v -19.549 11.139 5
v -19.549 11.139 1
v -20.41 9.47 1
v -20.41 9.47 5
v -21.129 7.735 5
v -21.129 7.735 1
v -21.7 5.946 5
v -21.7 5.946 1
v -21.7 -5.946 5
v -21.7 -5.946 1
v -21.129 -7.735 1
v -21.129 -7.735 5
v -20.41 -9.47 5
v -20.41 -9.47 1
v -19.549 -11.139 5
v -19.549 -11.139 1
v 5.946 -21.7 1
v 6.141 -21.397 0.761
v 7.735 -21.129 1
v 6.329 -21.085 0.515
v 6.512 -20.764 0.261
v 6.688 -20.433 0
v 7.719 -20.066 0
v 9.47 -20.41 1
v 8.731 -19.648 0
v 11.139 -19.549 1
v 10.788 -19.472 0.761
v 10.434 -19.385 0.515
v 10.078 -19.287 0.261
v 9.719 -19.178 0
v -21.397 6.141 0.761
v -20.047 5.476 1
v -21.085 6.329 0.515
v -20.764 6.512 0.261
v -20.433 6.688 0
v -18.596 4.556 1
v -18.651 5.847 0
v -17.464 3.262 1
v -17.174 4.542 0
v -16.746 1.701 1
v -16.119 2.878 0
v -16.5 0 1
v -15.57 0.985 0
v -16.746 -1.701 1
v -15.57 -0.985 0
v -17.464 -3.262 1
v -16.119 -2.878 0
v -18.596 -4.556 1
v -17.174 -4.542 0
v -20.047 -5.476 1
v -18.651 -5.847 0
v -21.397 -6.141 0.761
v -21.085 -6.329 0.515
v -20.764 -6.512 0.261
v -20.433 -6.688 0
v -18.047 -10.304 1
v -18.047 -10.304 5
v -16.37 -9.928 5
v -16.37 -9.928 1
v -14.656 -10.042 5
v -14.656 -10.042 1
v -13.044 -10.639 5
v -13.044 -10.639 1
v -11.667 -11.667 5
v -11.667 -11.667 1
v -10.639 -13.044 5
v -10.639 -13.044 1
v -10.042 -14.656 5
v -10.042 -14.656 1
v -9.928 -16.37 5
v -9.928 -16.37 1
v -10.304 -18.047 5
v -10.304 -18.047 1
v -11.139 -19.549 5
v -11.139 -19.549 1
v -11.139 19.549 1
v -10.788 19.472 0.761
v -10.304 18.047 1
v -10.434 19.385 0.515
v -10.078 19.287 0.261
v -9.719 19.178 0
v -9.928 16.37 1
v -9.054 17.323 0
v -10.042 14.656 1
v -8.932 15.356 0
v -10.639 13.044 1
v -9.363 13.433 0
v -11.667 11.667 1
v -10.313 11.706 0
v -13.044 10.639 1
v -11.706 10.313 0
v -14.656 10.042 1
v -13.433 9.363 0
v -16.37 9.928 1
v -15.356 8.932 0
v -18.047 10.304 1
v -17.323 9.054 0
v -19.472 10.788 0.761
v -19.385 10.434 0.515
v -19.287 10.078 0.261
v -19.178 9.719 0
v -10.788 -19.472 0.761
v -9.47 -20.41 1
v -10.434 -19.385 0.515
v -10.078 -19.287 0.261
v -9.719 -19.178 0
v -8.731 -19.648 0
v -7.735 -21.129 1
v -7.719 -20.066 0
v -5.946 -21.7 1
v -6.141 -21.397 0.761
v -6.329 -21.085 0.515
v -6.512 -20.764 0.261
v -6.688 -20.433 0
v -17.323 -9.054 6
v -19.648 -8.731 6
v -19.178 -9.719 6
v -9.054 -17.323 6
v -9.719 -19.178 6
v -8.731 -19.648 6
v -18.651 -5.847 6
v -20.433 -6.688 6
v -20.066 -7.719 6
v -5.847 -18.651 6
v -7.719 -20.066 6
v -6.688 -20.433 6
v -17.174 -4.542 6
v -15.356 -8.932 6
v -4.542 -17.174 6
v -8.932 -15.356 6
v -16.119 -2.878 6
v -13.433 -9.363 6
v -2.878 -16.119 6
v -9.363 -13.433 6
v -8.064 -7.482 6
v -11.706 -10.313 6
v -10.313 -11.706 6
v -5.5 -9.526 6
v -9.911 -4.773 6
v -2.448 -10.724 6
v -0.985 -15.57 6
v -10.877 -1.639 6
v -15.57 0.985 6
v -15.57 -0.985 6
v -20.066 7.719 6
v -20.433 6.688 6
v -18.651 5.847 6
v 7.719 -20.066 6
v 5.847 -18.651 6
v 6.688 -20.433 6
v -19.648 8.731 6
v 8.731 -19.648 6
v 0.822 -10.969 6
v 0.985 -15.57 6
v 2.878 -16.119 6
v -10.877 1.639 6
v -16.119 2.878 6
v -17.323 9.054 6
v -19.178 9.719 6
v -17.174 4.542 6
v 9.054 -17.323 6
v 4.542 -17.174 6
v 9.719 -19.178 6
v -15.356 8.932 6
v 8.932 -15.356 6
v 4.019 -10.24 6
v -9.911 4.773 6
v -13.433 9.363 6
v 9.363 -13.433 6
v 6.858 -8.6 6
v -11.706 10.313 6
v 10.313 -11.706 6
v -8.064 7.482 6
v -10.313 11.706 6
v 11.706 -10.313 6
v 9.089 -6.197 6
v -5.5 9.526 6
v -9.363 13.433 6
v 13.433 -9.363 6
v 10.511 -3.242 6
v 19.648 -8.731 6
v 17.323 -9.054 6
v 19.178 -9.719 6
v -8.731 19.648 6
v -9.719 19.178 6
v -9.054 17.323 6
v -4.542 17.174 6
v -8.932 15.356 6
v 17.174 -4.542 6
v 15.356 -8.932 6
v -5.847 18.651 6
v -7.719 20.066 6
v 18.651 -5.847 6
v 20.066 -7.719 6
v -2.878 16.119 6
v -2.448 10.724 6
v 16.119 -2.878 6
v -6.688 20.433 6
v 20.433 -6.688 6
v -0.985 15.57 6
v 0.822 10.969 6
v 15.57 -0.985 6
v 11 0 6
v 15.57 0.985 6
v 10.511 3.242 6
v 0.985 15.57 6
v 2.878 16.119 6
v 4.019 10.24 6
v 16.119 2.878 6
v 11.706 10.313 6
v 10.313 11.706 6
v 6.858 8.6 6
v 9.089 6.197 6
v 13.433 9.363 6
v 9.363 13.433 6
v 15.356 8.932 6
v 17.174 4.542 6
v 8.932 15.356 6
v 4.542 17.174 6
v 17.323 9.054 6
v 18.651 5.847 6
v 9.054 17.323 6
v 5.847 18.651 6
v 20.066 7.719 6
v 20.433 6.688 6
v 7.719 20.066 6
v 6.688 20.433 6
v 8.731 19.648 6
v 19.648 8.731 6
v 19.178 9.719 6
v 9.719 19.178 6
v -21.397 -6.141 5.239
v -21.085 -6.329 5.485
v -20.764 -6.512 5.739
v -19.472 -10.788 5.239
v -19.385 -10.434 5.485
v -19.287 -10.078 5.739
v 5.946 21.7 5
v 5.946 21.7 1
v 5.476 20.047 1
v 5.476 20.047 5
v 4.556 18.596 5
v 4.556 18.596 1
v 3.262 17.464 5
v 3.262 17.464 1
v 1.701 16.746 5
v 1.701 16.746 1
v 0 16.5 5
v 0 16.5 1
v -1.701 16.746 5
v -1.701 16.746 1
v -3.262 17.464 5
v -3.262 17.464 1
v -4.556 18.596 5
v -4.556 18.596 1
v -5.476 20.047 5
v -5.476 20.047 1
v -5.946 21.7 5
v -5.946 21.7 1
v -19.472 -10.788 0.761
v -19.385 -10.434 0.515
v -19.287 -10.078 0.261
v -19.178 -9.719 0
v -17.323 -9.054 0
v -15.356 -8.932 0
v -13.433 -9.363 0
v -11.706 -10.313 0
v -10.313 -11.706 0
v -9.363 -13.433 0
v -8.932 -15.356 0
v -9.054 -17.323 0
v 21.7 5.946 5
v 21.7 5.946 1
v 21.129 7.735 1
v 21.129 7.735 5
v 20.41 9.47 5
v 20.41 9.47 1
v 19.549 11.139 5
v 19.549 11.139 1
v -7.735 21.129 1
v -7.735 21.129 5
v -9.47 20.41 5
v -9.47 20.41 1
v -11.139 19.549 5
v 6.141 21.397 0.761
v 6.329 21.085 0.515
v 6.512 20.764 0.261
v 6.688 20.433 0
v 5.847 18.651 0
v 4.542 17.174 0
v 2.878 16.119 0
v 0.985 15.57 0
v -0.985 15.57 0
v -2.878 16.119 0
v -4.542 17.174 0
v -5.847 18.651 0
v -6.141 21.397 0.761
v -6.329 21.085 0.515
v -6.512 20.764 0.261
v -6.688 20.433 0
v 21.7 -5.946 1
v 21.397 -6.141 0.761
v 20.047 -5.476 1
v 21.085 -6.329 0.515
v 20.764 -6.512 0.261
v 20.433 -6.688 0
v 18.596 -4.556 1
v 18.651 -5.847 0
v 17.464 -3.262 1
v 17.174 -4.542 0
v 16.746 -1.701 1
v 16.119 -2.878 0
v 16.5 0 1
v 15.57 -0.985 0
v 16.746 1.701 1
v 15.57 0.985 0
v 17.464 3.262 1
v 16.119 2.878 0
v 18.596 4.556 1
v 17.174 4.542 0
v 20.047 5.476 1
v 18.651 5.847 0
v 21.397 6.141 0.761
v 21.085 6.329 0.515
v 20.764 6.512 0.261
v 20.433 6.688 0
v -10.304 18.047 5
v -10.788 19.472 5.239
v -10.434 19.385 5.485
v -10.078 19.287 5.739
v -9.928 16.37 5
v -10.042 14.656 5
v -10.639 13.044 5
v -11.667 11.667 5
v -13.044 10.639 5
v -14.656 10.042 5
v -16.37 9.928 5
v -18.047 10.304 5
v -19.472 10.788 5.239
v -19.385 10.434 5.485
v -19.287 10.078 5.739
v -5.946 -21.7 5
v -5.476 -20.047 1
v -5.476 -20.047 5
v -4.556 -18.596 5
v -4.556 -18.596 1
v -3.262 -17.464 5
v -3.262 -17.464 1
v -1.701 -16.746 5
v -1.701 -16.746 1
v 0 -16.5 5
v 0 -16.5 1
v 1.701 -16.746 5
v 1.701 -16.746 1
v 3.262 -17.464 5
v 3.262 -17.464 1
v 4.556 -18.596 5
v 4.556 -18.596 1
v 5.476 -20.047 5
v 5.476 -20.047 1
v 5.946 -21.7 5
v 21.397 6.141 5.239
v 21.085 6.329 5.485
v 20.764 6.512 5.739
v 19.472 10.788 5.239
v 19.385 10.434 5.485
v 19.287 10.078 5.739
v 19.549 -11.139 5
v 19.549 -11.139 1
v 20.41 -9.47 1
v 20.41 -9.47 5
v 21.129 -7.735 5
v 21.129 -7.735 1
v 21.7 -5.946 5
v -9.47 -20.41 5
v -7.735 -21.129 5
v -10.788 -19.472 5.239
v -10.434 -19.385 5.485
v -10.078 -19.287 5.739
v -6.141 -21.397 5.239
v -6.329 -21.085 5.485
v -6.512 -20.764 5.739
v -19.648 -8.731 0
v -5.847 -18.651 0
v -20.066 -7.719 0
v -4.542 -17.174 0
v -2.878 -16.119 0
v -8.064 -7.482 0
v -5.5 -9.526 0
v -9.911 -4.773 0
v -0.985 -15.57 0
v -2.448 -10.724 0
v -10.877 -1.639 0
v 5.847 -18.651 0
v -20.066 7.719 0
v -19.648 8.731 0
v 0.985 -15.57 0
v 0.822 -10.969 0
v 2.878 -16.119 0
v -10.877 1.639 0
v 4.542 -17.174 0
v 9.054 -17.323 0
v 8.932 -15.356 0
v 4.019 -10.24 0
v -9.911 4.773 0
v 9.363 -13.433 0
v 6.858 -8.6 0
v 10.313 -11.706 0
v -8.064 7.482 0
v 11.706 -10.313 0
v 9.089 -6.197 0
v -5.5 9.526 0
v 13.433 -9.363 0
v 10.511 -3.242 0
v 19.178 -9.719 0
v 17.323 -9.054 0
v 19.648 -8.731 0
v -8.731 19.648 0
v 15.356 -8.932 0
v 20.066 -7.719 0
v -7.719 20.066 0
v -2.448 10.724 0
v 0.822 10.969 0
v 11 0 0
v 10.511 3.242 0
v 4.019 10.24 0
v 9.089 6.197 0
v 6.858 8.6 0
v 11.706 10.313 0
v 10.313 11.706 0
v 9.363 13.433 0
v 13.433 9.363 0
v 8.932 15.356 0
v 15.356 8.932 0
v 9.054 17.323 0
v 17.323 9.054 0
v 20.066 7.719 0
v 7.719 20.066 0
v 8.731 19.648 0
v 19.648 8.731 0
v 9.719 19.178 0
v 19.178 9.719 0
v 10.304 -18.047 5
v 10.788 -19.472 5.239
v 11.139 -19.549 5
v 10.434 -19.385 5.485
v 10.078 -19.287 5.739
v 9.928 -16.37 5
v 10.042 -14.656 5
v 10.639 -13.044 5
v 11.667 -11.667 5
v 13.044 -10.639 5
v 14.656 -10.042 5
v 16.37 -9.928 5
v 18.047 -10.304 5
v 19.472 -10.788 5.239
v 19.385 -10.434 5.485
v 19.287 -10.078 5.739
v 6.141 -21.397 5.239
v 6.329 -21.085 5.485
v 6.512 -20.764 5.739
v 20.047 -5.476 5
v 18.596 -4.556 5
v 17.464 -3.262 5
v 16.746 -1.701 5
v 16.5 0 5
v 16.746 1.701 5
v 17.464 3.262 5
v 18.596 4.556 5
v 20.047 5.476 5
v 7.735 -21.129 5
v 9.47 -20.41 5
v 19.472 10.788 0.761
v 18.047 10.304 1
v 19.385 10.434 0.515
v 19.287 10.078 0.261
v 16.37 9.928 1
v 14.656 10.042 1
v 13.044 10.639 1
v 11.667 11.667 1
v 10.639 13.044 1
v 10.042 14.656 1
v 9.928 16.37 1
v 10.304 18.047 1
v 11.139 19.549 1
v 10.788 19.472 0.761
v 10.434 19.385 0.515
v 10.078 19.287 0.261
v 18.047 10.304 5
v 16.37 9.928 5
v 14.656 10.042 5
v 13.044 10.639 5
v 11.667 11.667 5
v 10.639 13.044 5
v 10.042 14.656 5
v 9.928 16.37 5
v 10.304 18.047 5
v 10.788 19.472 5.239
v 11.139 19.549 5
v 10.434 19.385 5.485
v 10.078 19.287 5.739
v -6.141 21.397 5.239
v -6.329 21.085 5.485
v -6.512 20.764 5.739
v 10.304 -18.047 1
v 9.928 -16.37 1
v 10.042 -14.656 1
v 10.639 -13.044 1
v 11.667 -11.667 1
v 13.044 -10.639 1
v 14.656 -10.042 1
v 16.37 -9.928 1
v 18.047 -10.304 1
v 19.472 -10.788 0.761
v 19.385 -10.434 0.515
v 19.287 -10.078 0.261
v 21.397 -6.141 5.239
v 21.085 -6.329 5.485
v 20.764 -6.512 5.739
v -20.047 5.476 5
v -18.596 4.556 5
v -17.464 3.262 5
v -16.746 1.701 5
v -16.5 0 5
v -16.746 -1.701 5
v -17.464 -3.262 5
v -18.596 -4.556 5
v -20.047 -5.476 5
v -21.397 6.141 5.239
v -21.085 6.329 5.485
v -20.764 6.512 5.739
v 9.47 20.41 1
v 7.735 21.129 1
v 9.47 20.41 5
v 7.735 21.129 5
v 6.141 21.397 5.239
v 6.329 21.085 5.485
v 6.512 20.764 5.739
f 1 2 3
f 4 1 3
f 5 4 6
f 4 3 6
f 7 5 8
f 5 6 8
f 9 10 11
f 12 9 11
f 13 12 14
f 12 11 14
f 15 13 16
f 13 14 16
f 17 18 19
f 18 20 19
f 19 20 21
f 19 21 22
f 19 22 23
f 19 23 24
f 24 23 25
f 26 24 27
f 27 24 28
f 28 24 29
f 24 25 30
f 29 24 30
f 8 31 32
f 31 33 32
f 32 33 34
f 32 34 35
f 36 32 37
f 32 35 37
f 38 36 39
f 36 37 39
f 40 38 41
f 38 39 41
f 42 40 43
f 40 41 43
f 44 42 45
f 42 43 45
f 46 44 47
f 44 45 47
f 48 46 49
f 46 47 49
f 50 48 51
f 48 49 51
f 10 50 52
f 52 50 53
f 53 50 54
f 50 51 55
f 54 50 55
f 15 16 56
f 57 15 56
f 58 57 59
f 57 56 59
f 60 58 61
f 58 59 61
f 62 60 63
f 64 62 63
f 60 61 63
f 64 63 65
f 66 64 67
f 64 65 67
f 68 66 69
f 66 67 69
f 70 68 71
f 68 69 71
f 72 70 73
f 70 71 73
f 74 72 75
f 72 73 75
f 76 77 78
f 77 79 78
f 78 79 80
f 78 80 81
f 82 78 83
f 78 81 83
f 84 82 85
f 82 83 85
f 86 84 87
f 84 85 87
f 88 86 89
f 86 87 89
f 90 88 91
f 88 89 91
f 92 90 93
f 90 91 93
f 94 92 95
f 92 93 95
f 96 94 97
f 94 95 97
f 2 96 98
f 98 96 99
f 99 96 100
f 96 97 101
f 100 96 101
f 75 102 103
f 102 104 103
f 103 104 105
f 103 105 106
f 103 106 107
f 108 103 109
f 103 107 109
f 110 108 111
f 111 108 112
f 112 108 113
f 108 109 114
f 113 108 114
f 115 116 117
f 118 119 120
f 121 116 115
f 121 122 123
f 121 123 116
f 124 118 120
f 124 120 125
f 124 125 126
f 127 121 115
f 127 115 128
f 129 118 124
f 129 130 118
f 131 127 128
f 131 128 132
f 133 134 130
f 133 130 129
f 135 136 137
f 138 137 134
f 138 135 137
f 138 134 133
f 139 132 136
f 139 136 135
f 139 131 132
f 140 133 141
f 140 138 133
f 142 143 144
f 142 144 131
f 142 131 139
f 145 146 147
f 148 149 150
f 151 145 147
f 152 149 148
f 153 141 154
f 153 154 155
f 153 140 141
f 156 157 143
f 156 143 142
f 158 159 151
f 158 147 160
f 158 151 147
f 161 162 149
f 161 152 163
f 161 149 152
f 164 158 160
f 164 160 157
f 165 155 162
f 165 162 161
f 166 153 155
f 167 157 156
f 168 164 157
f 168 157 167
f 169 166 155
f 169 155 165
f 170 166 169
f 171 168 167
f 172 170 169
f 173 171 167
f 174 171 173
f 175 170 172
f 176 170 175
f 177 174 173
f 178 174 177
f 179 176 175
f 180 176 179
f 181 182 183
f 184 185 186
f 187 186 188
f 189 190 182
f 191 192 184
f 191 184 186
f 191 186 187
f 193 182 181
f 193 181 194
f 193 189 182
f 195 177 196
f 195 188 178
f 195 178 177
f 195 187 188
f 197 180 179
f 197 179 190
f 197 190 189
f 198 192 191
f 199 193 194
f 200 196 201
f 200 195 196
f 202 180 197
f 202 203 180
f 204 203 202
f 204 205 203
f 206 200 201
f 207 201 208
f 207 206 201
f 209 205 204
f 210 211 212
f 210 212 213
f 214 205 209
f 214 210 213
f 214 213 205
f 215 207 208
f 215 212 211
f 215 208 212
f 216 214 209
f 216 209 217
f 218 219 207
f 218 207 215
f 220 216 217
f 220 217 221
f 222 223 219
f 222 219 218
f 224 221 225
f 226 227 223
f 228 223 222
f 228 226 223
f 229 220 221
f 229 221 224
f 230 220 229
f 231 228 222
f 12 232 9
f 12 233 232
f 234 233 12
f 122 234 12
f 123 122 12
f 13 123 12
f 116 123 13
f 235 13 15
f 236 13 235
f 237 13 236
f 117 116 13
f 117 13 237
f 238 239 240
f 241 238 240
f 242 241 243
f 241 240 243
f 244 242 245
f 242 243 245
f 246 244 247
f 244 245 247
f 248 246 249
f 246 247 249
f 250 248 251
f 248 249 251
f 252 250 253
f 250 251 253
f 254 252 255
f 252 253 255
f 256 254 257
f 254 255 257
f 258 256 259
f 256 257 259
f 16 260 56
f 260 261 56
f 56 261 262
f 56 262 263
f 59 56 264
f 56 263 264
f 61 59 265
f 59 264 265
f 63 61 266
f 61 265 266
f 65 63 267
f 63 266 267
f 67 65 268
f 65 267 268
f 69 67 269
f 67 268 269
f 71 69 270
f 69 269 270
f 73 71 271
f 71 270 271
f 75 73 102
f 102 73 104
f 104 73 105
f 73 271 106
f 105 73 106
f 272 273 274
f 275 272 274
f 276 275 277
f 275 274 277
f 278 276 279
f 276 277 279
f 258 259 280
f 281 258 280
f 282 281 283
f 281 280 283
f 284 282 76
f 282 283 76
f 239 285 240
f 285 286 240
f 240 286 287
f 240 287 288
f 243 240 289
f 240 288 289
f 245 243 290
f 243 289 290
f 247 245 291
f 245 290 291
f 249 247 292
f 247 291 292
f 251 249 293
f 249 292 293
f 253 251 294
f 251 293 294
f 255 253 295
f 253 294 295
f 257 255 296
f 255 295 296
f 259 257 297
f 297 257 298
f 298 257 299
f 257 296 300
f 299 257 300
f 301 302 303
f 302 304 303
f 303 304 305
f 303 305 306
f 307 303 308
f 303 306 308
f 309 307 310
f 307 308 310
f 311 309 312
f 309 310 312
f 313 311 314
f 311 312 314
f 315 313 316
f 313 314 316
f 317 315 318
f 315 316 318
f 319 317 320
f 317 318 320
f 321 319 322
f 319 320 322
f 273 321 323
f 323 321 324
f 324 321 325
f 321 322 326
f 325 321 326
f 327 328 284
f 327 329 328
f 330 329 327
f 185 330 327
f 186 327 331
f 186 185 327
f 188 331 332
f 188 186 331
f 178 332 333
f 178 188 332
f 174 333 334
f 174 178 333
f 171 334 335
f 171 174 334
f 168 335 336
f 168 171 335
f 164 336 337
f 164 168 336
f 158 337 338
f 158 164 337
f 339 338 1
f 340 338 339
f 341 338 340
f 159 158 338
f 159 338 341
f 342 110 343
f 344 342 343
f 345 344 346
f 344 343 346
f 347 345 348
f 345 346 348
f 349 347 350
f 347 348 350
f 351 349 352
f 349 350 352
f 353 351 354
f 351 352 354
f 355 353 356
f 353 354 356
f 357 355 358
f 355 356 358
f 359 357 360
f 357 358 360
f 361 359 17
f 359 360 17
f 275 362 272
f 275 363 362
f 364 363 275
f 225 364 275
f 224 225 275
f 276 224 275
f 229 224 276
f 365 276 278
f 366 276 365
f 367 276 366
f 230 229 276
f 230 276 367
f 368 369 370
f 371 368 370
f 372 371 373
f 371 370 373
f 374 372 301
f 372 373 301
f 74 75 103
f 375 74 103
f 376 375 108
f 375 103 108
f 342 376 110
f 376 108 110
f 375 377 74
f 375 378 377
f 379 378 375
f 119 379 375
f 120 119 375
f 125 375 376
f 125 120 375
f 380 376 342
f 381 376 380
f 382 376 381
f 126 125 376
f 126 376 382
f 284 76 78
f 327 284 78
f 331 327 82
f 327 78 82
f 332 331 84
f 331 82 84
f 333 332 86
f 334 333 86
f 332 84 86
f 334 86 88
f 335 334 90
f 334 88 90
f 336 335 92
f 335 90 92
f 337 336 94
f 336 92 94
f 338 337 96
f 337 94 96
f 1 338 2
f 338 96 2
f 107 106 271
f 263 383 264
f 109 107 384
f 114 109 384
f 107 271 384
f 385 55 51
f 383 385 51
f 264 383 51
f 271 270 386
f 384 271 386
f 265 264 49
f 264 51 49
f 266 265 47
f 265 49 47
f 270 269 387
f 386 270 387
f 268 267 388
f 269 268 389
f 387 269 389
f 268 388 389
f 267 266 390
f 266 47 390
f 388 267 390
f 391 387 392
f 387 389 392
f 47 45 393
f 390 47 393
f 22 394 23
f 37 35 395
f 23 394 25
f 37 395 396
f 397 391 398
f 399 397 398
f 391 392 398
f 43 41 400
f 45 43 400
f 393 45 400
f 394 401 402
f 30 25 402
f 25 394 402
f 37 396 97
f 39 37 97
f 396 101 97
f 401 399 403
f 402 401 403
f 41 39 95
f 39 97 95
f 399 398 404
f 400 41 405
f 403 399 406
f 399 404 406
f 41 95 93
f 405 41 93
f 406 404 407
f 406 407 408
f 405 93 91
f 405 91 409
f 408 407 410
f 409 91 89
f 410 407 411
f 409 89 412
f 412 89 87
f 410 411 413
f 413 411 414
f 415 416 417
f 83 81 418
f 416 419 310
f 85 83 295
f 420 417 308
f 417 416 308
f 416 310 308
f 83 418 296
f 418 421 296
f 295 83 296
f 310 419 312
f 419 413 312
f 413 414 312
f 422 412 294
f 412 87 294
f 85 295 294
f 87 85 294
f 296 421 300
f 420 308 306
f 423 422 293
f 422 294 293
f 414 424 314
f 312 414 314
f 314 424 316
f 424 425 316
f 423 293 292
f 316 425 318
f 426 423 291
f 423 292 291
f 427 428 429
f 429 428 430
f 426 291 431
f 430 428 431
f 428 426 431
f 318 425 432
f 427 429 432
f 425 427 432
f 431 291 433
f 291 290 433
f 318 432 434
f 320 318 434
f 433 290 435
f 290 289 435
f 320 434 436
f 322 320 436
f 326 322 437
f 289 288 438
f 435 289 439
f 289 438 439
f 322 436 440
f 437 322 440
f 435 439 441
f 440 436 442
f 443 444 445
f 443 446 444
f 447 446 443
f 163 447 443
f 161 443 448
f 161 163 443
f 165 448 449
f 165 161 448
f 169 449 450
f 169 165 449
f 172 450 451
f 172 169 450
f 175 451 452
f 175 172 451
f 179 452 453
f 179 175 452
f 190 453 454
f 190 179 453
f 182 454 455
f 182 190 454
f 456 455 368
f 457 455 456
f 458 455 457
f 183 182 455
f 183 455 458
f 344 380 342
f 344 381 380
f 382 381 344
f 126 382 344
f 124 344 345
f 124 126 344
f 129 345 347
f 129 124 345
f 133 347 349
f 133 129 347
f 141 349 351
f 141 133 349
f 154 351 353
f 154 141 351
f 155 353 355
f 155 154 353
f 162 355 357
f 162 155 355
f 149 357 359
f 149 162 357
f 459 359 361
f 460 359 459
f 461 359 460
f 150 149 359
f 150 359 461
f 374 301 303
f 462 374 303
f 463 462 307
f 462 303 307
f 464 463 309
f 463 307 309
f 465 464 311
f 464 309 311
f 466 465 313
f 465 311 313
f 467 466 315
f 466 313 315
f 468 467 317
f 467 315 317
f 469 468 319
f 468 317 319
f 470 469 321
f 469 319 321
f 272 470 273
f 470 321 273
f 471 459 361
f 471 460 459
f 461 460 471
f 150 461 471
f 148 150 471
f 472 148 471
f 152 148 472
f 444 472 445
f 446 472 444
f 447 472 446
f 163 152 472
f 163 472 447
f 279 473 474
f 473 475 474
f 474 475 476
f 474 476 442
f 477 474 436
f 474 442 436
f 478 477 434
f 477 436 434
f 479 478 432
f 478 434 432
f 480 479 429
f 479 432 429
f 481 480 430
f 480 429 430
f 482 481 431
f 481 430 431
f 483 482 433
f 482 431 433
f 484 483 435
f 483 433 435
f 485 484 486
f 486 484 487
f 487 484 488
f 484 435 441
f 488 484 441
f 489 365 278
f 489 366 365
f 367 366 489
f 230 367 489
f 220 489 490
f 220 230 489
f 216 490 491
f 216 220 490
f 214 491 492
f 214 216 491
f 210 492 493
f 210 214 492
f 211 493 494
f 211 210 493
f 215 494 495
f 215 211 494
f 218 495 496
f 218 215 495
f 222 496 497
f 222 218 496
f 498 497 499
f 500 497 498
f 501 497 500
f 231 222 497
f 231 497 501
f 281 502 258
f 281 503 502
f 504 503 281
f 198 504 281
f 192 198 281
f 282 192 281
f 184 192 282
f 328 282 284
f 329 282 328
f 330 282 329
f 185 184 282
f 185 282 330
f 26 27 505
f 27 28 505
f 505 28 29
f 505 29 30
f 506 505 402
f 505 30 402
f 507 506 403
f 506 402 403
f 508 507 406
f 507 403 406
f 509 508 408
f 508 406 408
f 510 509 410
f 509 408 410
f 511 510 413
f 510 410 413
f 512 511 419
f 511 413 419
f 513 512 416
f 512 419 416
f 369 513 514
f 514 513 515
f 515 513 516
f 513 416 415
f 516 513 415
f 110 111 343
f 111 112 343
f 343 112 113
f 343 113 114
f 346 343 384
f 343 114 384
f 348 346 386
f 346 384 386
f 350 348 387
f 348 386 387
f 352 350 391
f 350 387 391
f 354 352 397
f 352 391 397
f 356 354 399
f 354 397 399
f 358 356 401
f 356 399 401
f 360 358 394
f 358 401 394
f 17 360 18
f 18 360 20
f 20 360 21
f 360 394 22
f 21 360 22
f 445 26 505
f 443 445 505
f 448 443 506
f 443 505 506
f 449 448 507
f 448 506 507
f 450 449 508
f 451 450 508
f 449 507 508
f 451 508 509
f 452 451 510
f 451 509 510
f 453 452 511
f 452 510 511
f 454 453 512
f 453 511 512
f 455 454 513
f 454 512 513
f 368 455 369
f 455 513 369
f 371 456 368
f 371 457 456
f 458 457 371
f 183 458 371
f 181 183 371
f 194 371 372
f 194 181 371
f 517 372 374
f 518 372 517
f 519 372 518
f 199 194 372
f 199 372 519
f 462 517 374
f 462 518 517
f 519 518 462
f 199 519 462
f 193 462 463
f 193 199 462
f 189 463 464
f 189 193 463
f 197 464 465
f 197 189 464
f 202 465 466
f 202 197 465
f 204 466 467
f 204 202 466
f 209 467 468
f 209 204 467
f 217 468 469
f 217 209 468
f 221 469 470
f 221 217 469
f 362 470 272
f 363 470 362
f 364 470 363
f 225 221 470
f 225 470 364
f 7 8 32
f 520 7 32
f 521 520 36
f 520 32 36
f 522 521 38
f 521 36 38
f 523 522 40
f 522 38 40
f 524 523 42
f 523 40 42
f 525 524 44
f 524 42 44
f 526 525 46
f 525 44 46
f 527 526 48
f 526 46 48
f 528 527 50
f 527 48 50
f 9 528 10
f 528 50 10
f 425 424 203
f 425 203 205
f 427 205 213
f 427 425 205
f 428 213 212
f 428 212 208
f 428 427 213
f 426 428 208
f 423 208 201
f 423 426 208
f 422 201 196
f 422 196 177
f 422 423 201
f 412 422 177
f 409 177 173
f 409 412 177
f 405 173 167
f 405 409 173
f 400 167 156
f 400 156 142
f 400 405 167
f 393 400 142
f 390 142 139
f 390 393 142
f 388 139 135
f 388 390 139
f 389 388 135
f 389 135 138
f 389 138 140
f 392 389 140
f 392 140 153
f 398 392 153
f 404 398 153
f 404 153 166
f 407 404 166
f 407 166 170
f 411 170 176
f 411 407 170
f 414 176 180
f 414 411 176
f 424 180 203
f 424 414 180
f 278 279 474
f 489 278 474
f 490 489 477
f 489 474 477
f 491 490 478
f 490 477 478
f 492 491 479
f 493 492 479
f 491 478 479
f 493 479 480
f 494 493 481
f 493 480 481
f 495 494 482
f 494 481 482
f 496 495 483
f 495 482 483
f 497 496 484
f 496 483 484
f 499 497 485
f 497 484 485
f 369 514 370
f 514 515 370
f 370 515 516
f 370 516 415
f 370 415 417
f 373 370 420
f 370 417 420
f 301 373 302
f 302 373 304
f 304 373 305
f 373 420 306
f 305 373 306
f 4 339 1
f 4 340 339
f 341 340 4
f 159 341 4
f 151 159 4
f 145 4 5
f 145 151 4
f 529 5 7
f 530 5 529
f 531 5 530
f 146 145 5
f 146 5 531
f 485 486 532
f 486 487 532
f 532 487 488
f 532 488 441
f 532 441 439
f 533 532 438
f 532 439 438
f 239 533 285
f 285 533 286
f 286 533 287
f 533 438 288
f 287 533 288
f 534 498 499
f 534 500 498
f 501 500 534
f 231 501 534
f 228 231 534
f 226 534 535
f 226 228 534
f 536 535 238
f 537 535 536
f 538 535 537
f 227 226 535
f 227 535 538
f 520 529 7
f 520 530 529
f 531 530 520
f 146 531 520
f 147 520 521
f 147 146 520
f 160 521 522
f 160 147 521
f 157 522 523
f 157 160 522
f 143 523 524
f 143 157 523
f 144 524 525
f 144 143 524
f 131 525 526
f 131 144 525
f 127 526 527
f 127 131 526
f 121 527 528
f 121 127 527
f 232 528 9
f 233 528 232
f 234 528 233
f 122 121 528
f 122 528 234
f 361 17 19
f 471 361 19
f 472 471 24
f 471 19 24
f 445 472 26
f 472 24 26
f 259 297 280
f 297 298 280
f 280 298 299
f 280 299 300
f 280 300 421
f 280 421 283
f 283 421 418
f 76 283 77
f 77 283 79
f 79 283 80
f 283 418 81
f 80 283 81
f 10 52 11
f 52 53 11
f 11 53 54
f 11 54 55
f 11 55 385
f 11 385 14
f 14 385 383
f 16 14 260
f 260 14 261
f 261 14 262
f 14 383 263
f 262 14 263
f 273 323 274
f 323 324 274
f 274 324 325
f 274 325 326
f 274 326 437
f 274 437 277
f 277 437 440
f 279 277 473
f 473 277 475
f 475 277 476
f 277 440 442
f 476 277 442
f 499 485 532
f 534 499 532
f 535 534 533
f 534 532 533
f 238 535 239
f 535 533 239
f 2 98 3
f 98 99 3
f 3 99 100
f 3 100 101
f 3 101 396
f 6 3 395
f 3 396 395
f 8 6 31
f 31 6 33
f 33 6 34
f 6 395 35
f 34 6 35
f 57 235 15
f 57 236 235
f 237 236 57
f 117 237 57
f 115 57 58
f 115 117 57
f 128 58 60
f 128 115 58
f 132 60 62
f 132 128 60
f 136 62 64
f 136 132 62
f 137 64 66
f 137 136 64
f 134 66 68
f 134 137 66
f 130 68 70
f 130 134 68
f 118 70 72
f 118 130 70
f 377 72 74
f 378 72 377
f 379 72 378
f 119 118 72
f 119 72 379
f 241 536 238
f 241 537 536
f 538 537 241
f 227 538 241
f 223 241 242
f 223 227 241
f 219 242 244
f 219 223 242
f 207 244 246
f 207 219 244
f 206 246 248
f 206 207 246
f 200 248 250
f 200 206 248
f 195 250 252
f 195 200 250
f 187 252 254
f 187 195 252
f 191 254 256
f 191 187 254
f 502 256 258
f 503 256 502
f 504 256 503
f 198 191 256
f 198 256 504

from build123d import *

# Parameters (mm, degrees)
F0_R     = 11
F1_DEPTH = 6
F2_SIZE  = 1


with BuildPart() as f1:
    # F0 (on Top) → F1 (new body)
    with BuildSketch(Plane.XY):
        with BuildLine():
            ThreePointArc((-11.139458, 19.548976), (-11.667262, 11.667262), (-19.548976, 11.139458))
            ThreePointArc((-19.548976, 11.139458), (-20.787289, 8.610377), (-21.7, 5.946427))
            ThreePointArc((-21.7, 5.946427), (-16.5, 0), (-21.7, -5.946427))
            ThreePointArc((-21.7, -5.946427), (-20.787289, -8.610377), (-19.548976, -11.139458))
            ThreePointArc((-19.548976, -11.139458), (-11.667262, -11.667262), (-11.139458, -19.548976))
            ThreePointArc((-11.139458, -19.548976), (-8.610377, -20.787289), (-5.946427, -21.7))
            ThreePointArc((-5.946427, -21.7), (0, -16.5), (5.946427, -21.7))
            ThreePointArc((5.946427, -21.7), (8.610377, -20.787289), (11.139458, -19.548976))
            ThreePointArc((11.139458, -19.548976), (11.667262, -11.667262), (19.548976, -11.139458))
            ThreePointArc((19.548976, -11.139458), (20.787289, -8.610377), (21.7, -5.946427))
            ThreePointArc((21.7, -5.946427), (16.5, 0), (21.7, 5.946427))
            ThreePointArc((21.7, 5.946427), (20.787289, 8.610377), (19.548976, 11.139458))
            ThreePointArc((19.548976, 11.139458), (11.667262, 11.667262), (11.139458, 19.548976))
            ThreePointArc((11.139458, 19.548976), (8.610377, 20.787289), (5.946427, 21.7))
            ThreePointArc((5.946427, 21.7), (0, 16.5), (-5.946427, 21.7))
            ThreePointArc((-5.946427, 21.7), (-8.610377, 20.787289), (-11.139458, 19.548976))
        make_face()
        Circle(F0_R, mode=Mode.SUBTRACT)
    extrude(amount=F1_DEPTH)

    # F2
    f2_edges = [f1.edges().sort_by_distance(p)[0] for p in [
        (-16.5, 0, 0),
        (-20.787289, 8.610377, 0),
        (-11.667262, 11.667262, 0),
        (-8.610377, 20.787289, 0),
        (0, 16.5, 0),
        (8.610377, 20.787289, 0),
        (11.667262, 11.667262, 0),
        (20.787289, 8.610377, 0),
        (16.5, 0, 0),
        (11.667262, -11.667262, 0),
        (20.787289, -8.610377, 0),
        (8.610377, -20.787289, 0),
        (0, -16.5, 0),
        (-8.610377, -20.787289, 0),
        (-11.667262, -11.667262, 0),
        (-20.787289, -8.610377, 0),
        (0, 16.5, 6),
        (-11.667262, 11.667262, 6),
        (-8.610377, 20.787289, 6),
        (8.610377, 20.787289, 6),
        (11.667262, 11.667262, 6),
        (20.787289, 8.610377, 6),
        (16.5, 0, 6),
        (20.787289, -8.610377, 6),
        (11.667262, -11.667262, 6),
        (0, -16.5, 6),
        (8.610377, -20.787289, 6),
        (-8.610377, -20.787289, 6),
        (-11.667262, -11.667262, 6),
        (-20.787289, -8.610377, 6),
        (-16.5, 0, 6),
        (-20.787289, 8.610377, 6),
    ]]
    chamfer(f2_edges, length=F2_SIZE)


solid = f1.part
